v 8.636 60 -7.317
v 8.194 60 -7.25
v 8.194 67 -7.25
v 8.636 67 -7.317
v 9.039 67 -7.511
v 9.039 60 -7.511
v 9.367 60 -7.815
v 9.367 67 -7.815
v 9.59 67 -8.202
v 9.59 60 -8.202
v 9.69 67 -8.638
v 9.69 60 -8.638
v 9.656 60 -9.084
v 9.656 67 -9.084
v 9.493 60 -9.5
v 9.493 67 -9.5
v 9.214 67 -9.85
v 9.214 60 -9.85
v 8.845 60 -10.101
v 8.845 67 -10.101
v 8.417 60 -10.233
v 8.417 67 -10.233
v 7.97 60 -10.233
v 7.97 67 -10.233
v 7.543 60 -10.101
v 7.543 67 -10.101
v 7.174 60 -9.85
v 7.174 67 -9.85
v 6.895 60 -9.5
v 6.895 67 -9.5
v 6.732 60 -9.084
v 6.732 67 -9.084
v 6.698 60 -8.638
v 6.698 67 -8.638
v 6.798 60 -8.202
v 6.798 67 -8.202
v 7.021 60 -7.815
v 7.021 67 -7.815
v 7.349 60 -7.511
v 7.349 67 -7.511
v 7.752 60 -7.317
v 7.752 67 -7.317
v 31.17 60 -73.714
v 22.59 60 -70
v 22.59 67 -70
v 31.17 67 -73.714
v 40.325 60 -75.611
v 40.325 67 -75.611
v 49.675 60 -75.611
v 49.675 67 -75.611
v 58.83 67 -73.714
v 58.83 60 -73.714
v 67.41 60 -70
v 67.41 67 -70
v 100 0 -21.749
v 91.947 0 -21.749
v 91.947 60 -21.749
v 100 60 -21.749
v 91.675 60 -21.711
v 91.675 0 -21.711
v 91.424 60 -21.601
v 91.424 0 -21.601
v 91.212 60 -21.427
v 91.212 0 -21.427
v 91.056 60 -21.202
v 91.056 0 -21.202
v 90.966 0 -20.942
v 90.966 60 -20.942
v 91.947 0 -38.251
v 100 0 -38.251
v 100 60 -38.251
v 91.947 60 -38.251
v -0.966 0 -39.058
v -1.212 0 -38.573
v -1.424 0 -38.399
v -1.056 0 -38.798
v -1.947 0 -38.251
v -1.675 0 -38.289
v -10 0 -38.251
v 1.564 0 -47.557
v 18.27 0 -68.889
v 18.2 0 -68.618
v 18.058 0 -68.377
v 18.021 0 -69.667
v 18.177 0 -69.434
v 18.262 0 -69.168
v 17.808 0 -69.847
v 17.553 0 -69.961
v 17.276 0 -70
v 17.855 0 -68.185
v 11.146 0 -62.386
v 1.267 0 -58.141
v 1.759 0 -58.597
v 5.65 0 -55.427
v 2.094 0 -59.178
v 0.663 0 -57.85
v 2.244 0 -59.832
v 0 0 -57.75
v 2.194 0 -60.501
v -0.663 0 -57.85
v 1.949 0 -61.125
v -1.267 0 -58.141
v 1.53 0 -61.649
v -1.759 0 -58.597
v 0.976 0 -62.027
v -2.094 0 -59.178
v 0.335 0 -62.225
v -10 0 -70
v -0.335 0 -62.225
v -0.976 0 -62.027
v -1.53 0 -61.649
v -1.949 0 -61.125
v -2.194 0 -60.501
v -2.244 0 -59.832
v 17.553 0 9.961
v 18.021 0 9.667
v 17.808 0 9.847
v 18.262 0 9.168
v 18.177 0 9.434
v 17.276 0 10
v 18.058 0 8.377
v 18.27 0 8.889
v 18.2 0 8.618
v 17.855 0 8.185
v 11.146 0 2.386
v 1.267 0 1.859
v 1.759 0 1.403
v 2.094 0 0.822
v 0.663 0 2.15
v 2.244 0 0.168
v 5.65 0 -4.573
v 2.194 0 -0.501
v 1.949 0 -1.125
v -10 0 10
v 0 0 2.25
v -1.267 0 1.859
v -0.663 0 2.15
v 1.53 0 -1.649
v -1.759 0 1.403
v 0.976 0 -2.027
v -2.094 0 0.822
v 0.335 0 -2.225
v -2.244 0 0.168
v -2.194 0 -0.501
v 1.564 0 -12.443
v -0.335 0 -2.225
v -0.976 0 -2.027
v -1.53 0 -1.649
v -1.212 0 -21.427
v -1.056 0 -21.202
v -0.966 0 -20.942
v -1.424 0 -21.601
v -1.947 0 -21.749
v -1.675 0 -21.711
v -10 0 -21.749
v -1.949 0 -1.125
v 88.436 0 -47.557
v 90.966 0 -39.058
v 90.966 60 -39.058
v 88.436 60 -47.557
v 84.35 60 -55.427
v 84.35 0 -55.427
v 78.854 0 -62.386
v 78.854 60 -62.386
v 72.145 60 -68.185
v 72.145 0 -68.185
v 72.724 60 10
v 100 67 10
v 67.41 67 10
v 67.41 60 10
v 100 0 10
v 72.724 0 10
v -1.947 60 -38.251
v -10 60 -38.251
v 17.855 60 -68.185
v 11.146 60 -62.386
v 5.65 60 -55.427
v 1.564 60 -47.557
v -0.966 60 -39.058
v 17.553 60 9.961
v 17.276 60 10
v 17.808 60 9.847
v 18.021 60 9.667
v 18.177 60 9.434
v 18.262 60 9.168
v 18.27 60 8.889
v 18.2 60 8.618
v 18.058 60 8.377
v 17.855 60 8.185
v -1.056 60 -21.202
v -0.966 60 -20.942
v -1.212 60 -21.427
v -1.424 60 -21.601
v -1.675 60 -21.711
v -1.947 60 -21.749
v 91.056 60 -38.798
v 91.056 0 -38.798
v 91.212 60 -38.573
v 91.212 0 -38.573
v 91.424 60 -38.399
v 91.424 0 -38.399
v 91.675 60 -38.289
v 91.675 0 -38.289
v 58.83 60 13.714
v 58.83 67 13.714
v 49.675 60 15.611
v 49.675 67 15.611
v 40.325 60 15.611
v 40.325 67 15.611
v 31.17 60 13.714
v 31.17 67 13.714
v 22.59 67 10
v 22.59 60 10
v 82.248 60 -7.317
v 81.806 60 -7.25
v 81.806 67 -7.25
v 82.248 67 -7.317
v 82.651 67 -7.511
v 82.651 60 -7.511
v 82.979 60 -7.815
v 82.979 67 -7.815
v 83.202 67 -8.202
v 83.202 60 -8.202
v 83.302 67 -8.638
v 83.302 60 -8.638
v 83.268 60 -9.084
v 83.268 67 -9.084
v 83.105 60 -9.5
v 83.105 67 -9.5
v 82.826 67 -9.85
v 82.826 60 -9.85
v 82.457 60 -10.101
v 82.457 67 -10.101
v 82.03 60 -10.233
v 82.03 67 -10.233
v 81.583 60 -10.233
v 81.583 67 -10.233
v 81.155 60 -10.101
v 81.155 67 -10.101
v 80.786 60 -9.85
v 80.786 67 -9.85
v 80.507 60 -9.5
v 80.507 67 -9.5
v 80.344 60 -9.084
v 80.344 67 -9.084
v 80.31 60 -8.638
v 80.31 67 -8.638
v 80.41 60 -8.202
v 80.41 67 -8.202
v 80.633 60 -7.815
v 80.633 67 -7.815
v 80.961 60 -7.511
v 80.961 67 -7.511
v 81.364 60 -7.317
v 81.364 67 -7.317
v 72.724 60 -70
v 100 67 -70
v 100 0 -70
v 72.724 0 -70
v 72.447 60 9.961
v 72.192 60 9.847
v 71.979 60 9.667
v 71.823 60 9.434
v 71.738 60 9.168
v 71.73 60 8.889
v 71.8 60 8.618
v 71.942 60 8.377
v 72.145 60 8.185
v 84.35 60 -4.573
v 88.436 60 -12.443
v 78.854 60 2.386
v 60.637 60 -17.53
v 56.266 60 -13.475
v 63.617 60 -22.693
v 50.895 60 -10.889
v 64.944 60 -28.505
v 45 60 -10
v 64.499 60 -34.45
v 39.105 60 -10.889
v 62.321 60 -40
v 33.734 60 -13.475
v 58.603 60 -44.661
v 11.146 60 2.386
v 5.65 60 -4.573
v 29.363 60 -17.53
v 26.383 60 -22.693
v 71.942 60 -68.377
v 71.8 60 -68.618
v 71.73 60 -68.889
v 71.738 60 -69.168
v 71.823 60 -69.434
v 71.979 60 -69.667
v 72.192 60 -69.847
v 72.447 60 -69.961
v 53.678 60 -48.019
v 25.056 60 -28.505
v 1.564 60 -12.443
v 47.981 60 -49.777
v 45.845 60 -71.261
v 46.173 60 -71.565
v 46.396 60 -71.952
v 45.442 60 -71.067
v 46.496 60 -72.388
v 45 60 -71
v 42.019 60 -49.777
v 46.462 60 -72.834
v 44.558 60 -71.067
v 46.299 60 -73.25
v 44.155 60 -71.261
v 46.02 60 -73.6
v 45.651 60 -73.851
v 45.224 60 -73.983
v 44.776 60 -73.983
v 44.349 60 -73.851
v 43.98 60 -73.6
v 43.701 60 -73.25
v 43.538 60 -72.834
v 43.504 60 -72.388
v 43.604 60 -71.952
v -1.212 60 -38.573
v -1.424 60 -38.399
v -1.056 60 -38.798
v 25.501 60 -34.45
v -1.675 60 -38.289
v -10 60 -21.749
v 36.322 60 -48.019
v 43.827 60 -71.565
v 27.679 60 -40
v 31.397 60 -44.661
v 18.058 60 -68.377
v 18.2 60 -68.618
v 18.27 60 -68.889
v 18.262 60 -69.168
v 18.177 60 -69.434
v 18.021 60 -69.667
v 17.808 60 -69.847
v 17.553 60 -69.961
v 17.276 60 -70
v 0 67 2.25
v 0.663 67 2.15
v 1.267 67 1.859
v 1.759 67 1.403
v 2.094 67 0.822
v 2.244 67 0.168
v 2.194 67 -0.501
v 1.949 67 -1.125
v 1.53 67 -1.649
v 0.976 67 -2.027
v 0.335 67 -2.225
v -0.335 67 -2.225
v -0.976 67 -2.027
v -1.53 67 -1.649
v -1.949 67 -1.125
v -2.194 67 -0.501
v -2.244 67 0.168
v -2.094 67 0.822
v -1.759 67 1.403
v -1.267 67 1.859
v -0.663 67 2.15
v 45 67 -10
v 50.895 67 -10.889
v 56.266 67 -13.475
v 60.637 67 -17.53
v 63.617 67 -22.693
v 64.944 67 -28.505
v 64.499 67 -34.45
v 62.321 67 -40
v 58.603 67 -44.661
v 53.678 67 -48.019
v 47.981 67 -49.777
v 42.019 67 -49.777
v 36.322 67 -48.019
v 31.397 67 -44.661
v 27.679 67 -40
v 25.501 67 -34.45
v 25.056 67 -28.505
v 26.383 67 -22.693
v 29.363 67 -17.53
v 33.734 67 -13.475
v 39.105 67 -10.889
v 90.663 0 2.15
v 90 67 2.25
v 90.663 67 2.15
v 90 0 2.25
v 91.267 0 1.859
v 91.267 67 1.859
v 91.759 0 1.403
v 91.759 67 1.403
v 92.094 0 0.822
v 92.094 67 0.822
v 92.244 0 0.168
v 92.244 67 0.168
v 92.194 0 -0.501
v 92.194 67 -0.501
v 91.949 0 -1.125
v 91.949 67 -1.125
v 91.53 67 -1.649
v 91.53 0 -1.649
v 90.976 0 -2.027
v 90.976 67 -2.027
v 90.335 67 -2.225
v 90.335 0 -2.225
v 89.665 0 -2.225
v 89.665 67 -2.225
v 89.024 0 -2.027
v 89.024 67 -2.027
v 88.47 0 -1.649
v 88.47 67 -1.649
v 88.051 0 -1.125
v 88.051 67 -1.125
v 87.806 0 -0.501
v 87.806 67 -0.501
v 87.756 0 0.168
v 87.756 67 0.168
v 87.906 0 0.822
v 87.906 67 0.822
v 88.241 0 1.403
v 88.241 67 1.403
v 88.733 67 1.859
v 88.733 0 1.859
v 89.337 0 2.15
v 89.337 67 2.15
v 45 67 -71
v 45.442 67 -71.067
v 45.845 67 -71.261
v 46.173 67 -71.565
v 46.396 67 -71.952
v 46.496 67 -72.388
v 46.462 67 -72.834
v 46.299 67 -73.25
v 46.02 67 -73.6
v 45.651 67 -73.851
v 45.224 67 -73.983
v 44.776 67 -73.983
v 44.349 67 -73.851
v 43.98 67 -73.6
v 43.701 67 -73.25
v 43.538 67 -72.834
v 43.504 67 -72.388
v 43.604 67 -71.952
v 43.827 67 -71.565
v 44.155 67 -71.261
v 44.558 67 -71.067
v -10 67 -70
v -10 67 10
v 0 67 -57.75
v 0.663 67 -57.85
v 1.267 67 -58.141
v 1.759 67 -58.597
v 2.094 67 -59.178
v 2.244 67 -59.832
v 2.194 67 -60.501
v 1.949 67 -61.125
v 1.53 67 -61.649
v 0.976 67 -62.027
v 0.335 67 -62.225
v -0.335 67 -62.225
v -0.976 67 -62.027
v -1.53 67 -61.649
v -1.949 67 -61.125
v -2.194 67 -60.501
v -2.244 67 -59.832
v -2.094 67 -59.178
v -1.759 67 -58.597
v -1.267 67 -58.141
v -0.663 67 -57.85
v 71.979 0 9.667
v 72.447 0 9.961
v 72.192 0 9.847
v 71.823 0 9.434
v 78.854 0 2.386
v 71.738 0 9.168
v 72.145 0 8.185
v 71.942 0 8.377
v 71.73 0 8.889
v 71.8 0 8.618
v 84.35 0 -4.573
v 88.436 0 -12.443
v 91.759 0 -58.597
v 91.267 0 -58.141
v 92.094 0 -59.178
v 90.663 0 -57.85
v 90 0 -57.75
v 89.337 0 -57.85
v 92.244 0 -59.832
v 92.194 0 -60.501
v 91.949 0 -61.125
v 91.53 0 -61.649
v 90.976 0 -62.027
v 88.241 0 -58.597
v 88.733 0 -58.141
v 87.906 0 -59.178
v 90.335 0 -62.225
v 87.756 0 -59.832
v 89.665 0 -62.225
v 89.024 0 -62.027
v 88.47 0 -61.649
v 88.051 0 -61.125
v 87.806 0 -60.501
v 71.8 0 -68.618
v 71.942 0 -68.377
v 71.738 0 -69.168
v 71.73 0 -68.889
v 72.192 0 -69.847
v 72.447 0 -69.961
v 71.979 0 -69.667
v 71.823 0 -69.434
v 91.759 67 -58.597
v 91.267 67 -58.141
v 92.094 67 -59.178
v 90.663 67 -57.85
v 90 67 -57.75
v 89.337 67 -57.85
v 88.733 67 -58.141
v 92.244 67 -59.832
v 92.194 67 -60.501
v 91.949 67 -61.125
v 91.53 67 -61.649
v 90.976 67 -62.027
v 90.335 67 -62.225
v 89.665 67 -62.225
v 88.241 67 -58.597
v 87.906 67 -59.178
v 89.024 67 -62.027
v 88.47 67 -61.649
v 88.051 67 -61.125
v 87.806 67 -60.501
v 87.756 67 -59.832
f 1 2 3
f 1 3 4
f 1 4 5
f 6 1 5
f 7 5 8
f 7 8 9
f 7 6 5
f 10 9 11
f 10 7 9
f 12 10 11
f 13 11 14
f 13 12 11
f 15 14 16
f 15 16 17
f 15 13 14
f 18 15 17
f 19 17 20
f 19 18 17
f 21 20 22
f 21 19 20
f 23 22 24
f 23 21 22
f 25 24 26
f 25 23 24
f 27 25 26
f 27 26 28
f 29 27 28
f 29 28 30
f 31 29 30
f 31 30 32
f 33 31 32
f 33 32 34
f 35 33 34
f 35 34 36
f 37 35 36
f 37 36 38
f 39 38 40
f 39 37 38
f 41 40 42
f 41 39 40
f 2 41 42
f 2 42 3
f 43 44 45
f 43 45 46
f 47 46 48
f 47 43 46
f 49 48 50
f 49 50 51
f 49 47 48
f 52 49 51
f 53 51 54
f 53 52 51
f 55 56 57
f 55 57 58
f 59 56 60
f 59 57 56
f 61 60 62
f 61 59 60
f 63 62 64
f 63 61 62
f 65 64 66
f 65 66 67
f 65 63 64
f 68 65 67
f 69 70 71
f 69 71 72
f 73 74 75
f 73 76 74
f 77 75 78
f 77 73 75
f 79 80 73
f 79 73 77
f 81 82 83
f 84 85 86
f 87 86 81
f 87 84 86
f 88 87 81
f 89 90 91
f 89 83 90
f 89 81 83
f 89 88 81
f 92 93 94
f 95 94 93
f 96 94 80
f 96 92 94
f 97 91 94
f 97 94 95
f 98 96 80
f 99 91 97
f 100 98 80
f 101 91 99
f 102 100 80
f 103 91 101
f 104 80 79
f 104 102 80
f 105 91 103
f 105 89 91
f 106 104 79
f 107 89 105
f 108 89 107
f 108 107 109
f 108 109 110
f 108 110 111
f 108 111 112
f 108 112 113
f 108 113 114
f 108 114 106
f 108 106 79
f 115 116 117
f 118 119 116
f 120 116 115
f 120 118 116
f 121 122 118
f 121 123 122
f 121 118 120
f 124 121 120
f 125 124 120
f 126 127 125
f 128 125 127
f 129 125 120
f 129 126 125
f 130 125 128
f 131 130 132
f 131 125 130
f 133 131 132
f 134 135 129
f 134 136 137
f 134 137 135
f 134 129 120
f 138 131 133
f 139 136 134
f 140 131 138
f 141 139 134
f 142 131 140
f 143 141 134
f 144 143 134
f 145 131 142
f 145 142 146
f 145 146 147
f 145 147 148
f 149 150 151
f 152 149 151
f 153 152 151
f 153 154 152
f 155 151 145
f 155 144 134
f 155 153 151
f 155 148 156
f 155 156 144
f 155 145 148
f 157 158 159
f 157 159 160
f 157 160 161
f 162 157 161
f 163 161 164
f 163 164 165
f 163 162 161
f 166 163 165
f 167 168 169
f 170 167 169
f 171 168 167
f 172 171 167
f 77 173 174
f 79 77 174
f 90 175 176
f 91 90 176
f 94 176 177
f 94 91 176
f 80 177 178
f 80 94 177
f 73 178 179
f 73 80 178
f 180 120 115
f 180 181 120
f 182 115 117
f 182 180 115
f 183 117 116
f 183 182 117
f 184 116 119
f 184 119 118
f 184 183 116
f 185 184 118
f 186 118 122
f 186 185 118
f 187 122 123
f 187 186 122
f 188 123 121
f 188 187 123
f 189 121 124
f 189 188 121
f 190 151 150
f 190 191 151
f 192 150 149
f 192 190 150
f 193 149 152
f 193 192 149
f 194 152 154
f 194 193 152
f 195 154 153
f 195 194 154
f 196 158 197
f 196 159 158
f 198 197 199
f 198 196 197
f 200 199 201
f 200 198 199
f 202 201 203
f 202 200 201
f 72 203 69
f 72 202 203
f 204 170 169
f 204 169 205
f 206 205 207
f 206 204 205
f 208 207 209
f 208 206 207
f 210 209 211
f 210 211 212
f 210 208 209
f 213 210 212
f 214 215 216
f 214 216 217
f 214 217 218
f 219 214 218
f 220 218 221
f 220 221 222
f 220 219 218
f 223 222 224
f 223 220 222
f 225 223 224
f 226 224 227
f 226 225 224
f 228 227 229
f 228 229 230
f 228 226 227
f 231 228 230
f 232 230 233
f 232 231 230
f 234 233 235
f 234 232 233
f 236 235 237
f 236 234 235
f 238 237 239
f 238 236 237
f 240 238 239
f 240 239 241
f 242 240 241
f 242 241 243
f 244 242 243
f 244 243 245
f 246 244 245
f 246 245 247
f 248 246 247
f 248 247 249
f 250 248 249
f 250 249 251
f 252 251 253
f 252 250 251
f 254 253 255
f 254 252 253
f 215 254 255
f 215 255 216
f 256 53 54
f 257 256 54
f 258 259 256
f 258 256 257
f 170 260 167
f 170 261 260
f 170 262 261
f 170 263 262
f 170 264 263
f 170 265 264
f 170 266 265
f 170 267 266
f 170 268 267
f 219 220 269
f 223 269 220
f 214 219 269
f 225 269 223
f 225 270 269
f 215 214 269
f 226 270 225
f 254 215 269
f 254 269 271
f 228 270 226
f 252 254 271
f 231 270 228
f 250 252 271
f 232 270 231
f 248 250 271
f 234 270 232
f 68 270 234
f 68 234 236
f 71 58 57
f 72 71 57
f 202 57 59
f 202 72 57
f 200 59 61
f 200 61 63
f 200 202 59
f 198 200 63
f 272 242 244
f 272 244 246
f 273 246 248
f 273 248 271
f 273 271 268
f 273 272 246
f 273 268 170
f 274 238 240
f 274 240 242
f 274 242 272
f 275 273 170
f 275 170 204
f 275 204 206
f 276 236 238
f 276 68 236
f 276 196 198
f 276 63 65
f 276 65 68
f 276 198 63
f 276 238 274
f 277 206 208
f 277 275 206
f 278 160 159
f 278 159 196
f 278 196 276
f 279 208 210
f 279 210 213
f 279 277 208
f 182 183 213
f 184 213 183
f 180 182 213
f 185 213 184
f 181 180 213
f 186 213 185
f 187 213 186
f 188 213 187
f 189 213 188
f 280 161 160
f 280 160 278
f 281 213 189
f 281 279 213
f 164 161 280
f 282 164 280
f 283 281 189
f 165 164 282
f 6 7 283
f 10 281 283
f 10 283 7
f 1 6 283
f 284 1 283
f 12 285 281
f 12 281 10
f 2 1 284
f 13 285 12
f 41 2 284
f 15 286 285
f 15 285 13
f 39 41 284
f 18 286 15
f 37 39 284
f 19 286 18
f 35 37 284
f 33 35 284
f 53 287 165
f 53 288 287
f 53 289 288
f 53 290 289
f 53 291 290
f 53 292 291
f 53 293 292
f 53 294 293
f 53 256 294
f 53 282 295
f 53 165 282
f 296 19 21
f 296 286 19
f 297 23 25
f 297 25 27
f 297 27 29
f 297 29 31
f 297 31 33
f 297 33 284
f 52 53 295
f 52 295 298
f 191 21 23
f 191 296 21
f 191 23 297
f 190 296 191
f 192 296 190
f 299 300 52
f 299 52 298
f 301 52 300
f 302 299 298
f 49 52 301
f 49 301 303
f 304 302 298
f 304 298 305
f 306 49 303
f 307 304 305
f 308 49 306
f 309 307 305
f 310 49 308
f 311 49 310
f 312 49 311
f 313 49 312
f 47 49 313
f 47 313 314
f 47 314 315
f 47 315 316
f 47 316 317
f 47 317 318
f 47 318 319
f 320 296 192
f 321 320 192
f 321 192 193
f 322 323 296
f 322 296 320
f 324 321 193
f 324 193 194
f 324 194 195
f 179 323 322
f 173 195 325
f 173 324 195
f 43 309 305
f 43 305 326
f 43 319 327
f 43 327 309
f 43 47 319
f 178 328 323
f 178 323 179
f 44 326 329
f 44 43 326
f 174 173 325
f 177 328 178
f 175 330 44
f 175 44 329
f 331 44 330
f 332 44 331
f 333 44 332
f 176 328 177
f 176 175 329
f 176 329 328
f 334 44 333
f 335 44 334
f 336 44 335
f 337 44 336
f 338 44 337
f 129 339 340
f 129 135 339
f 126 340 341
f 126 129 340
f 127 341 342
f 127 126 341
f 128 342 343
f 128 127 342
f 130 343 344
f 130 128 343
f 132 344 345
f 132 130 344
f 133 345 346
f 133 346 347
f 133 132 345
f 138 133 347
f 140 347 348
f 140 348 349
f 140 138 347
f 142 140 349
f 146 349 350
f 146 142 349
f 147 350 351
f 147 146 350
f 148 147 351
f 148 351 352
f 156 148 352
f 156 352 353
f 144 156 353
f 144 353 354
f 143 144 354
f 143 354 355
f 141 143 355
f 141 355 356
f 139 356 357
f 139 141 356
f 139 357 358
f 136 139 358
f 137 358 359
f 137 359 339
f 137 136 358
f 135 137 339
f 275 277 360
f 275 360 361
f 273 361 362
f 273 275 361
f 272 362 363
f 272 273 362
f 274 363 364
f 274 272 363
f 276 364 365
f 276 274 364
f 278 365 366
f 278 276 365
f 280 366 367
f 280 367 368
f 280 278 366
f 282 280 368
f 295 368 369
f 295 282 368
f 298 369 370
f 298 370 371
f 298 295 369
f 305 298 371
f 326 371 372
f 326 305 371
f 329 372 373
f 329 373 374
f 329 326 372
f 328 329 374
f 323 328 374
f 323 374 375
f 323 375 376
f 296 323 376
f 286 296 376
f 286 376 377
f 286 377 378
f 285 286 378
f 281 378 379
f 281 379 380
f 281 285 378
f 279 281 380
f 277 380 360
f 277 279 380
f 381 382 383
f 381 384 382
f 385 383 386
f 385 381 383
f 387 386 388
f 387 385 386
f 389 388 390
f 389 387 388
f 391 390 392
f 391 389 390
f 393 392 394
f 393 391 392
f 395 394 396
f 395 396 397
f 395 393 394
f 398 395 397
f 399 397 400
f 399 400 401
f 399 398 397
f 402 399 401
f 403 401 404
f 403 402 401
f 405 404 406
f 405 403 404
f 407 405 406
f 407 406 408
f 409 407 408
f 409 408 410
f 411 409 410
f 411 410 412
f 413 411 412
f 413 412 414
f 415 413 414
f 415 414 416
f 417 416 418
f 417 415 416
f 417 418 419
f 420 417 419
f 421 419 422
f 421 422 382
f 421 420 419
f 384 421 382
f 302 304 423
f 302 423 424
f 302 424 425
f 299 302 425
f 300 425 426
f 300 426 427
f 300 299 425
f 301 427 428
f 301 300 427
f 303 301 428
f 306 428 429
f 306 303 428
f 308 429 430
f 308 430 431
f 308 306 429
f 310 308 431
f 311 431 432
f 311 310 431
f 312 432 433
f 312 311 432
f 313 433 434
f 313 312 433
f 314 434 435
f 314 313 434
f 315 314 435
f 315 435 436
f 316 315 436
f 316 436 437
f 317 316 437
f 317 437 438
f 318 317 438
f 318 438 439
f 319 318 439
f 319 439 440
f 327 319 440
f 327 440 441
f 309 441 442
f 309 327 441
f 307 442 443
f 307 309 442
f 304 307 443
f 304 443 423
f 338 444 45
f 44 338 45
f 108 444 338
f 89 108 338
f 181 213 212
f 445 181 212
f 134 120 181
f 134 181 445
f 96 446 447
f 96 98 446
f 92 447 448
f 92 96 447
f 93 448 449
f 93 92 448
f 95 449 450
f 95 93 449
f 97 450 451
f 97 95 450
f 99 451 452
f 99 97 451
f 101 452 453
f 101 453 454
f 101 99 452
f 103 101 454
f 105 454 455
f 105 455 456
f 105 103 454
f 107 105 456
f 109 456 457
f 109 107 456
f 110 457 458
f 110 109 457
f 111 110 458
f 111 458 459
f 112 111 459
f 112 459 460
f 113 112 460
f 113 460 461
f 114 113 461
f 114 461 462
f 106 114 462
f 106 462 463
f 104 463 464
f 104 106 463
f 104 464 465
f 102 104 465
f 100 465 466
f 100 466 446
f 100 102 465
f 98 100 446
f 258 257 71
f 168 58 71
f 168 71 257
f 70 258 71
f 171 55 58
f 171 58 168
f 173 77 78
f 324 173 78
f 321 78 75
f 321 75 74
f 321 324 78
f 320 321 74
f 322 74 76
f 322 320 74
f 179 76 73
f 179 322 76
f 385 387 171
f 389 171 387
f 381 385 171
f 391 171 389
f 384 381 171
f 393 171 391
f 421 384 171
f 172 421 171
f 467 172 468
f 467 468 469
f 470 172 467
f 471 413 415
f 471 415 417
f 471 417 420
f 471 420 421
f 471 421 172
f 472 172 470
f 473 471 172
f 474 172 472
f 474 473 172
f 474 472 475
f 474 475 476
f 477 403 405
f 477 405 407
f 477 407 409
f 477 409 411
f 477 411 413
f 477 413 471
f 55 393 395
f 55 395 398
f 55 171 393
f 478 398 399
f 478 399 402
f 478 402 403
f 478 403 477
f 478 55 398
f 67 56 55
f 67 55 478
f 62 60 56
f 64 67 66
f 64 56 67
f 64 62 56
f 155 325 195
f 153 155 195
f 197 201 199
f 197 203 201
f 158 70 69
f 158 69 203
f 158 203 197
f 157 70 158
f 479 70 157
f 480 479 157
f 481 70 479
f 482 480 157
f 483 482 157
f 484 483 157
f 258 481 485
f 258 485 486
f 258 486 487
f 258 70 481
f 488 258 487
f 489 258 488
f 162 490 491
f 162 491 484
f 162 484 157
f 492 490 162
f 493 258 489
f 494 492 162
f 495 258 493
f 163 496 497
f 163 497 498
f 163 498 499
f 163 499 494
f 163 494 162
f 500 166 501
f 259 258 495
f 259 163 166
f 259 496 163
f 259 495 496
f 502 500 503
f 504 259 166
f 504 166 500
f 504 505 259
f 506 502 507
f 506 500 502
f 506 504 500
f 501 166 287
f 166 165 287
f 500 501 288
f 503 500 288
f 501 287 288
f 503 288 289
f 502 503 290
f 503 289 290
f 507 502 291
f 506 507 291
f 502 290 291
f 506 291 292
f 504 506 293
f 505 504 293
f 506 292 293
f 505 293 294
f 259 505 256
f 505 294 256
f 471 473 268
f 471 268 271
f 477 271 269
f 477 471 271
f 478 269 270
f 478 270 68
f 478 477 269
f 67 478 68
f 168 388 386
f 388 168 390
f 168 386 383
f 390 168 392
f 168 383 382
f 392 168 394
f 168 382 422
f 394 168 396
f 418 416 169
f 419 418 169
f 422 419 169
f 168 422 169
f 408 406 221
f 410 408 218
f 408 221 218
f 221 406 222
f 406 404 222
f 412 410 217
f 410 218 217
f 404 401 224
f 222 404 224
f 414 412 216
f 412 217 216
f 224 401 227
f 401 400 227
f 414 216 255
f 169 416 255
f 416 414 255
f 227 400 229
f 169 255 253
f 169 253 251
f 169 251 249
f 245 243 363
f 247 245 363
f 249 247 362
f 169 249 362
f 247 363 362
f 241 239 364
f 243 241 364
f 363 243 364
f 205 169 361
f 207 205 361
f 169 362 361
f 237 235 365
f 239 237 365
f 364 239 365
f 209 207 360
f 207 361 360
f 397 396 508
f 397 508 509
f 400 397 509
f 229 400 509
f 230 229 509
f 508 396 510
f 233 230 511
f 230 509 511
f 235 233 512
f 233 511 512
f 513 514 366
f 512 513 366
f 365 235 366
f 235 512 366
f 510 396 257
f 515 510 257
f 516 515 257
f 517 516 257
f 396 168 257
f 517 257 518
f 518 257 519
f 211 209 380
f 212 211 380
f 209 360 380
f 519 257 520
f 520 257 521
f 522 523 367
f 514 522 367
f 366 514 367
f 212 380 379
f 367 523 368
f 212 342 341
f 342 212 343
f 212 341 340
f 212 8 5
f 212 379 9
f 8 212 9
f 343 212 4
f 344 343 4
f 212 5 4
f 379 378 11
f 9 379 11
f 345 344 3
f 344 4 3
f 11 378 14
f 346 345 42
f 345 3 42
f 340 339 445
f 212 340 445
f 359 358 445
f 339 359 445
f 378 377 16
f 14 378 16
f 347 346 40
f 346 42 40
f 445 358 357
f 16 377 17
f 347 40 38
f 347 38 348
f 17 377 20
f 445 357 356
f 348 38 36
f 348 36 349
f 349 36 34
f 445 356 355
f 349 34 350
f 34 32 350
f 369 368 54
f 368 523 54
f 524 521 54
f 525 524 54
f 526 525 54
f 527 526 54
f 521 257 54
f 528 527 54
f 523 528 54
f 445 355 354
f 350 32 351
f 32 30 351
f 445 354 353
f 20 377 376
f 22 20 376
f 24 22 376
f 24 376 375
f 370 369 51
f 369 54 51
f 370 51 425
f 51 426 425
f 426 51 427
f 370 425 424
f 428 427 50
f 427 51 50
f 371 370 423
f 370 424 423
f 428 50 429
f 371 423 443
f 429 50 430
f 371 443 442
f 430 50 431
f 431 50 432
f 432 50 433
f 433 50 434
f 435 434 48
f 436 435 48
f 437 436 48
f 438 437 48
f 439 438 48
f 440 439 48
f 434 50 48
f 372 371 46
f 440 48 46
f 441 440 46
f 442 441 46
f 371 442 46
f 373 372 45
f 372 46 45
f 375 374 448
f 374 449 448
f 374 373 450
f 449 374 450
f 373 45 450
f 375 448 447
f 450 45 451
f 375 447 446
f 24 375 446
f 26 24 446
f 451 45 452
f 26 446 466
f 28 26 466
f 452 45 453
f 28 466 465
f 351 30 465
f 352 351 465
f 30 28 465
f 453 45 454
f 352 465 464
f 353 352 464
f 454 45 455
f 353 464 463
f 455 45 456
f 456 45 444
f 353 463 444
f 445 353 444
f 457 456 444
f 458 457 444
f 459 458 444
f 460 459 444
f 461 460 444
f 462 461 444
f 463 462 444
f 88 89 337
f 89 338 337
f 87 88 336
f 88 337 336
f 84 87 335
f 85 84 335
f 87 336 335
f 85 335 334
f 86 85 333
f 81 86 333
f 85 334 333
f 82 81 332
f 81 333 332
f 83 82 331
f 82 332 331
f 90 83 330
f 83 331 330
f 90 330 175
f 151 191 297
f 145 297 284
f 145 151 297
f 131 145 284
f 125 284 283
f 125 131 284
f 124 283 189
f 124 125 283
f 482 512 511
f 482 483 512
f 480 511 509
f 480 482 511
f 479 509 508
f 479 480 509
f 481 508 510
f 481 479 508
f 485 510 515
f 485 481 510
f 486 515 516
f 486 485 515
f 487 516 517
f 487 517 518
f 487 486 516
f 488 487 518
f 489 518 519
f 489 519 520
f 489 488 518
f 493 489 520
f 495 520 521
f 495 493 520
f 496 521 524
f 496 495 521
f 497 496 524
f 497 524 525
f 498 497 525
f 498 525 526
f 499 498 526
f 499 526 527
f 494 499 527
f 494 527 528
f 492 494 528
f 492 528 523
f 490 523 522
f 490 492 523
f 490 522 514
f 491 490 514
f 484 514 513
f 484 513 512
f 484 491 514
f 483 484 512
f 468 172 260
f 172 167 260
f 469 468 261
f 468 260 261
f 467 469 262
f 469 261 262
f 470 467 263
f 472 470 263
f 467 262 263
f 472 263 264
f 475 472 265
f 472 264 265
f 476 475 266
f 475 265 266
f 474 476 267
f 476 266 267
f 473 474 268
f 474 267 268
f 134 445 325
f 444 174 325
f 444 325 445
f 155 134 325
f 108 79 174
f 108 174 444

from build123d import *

# Parameters (mm, degrees)
SKETCH1_R             = 2.25
BOSS_EXTRUDE1_DEPTH   = 60
BOSS_EXTRUDE1_2_DEPTH = 60
BOSS_EXTRUDE1_3_DEPTH = 60
BOSS_EXTRUDE1_4_DEPTH = 60
SKETCH5_R             = 1.5
SKETCH5_R_2           = 20
SKETCH5_R_3           = 2.25
BOSS_EXTRUDE3_DEPTH   = 7
FILLET1_R             = 1


with BuildPart() as part:
    # Sketch1 → Boss-Extrude1 (new body)
    with BuildSketch(Plane(origin=(0, 0, 0), x_dir=(1, 0, 0), z_dir=(0, 1, 0))):
        with BuildLine():
            ThreePointArc((20.608966812, 70), (6.336439637, 56.458488242), (-1.117716003, 38.250986042))
            Line((-1.117716003, 38.250986042), (-10, 38.250986042))
            Line((-10, 38.250986042), (-10, 70))
            Line((-10, 70), (20.608966812, 70))
        make_face()
        with Locations(Location((0, 60, 0), (0, 0, 270))):
            Circle(SKETCH1_R, mode=Mode.SUBTRACT)
    extrude(amount=BOSS_EXTRUDE1_DEPTH)



with BuildPart() as body_2:
    # Sketch1 → Boss-Extrude1 2 (new body)
    with BuildSketch(Plane(origin=(0, 0, 0), x_dir=(1, 0, 0), z_dir=(0, 1, 0))):
        with BuildLine():
            ThreePointArc((-1.117716003, 21.749013958), (6.336439637, 3.541511758), (20.608966812, -10))
            Line((20.608966812, -10), (-10, -10))
            Line((-10, -10), (-10, 21.749013958))
            Line((-10, 21.749013958), (-1.117716003, 21.749013958))
        make_face()
        with Locations(Location((0, 0, 0), (0, 0, 270))):
            Circle(SKETCH1_R, mode=Mode.SUBTRACT)
    extrude(amount=BOSS_EXTRUDE1_2_DEPTH)


with BuildPart() as body_3:
    # Sketch1 → Boss-Extrude1 3 (new body)
    with BuildSketch(Plane(origin=(0, 0, 0), x_dir=(1, 0, 0), z_dir=(0, 1, 0))):
        with BuildLine():
            ThreePointArc((91.117716003, 38.250986042), (83.663560363, 56.458488242), (69.391033188, 70))
            Line((69.391033188, 70), (100, 70))
            Line((100, 70), (100, 38.250986042))
            Line((100, 38.250986042), (91.117716003, 38.250986042))
        make_face()
        with Locations(Location((90, 60, 0), (0, 0, 270))):
            Circle(SKETCH1_R, mode=Mode.SUBTRACT)
    extrude(amount=BOSS_EXTRUDE1_3_DEPTH)


with BuildPart() as body_4:
    # Sketch1 → Boss-Extrude1 4 (new body)
    with BuildSketch(Plane(origin=(0, 0, 0), x_dir=(1, 0, 0), z_dir=(0, 1, 0))):
        with BuildLine():
            ThreePointArc((69.391033188, -10), (83.663560363, 3.541511758), (91.117716003, 21.749013958))
            Line((91.117716003, 21.749013958), (100, 21.749013958))
            Line((100, 21.749013958), (100, -10))
            Line((100, -10), (69.391033188, -10))
        make_face()
        with Locations(Location((90, 0, 0), (0, 0, 270))):
            Circle(SKETCH1_R, mode=Mode.SUBTRACT)
    extrude(amount=BOSS_EXTRUDE1_4_DEPTH)


with BuildPart() as part_1:
    add(part.part)

    add(body_2.part)  # Boss-Extrude3 merges body 2

    add(body_3.part)  # Boss-Extrude3 merges body 3

    add(body_4.part)  # Boss-Extrude3 merges body 4
    # Sketch5 → Boss-Extrude3 (add)
    with BuildSketch(Plane(origin=(0, 60, 0), x_dir=(1, 0, 0), z_dir=(0, 1, 0))):
        with BuildLine():
            Line((-10, 70), (22.589678717, 70))
            ThreePointArc((22.589678717, 70), (45, 75.85), (67.410321283, 70))
            Line((67.410321283, 70), (100, 70))
            Line((100, 70), (100, -10))
            Line((100, -10), (67.410321283, -10))
            ThreePointArc((67.410321283, -10), (45, -15.85), (22.589678717, -10))
            Line((22.589678717, -10), (-10, -10))
            Line((-10, -10), (-10, 70))
        make_face()
        with Locations(Location((81.806079661, 8.75, 0), (0, 0, 270))):
            Circle(SKETCH5_R, mode=Mode.SUBTRACT)
        with Locations(Location((45, 72.5, 0), (0, 0, 270))):
            Circle(SKETCH5_R, mode=Mode.SUBTRACT)
        with Locations(Location((8.193920339, 8.75, 0), (0, 0, 270))):
            Circle(SKETCH5_R, mode=Mode.SUBTRACT)
        with Locations(Location((45, 30, 0), (0, 0, 270))):
            Circle(SKETCH5_R_2, mode=Mode.SUBTRACT)
        with Locations(Location((90, 60, 0), (0, 0, 270))):
            Circle(SKETCH5_R_3, mode=Mode.SUBTRACT)
        with Locations(Location((90, 0, 0), (0, 0, 270))):
            Circle(SKETCH5_R_3, mode=Mode.SUBTRACT)
        with Locations(Location((0, 0, 0), (0, 0, 270))):
            Circle(SKETCH5_R_3, mode=Mode.SUBTRACT)
        with Locations(Location((0, 60, 0), (0, 0, 270))):
            Circle(SKETCH5_R_3, mode=Mode.SUBTRACT)
    extrude(amount=BOSS_EXTRUDE3_DEPTH)

    # Fillet1
    fillet1_edges = [part_1.edges().sort_by_distance(p)[0] for p in [
        (-1.117716003, 30, -38.250986042),
        (20.608966812, 30, -70),
        (20.608966812, 30, 10),
        (-1.117716003, 30, -21.749013958),
        (69.391033188, 30, -70),
        (91.117716003, 30, -38.250986042),
        (91.117716003, 30, -21.749013958),
        (69.391033188, 30, 10),
    ]]
    fillet(fillet1_edges, radius=FILLET1_R)


solid = part_1.part
